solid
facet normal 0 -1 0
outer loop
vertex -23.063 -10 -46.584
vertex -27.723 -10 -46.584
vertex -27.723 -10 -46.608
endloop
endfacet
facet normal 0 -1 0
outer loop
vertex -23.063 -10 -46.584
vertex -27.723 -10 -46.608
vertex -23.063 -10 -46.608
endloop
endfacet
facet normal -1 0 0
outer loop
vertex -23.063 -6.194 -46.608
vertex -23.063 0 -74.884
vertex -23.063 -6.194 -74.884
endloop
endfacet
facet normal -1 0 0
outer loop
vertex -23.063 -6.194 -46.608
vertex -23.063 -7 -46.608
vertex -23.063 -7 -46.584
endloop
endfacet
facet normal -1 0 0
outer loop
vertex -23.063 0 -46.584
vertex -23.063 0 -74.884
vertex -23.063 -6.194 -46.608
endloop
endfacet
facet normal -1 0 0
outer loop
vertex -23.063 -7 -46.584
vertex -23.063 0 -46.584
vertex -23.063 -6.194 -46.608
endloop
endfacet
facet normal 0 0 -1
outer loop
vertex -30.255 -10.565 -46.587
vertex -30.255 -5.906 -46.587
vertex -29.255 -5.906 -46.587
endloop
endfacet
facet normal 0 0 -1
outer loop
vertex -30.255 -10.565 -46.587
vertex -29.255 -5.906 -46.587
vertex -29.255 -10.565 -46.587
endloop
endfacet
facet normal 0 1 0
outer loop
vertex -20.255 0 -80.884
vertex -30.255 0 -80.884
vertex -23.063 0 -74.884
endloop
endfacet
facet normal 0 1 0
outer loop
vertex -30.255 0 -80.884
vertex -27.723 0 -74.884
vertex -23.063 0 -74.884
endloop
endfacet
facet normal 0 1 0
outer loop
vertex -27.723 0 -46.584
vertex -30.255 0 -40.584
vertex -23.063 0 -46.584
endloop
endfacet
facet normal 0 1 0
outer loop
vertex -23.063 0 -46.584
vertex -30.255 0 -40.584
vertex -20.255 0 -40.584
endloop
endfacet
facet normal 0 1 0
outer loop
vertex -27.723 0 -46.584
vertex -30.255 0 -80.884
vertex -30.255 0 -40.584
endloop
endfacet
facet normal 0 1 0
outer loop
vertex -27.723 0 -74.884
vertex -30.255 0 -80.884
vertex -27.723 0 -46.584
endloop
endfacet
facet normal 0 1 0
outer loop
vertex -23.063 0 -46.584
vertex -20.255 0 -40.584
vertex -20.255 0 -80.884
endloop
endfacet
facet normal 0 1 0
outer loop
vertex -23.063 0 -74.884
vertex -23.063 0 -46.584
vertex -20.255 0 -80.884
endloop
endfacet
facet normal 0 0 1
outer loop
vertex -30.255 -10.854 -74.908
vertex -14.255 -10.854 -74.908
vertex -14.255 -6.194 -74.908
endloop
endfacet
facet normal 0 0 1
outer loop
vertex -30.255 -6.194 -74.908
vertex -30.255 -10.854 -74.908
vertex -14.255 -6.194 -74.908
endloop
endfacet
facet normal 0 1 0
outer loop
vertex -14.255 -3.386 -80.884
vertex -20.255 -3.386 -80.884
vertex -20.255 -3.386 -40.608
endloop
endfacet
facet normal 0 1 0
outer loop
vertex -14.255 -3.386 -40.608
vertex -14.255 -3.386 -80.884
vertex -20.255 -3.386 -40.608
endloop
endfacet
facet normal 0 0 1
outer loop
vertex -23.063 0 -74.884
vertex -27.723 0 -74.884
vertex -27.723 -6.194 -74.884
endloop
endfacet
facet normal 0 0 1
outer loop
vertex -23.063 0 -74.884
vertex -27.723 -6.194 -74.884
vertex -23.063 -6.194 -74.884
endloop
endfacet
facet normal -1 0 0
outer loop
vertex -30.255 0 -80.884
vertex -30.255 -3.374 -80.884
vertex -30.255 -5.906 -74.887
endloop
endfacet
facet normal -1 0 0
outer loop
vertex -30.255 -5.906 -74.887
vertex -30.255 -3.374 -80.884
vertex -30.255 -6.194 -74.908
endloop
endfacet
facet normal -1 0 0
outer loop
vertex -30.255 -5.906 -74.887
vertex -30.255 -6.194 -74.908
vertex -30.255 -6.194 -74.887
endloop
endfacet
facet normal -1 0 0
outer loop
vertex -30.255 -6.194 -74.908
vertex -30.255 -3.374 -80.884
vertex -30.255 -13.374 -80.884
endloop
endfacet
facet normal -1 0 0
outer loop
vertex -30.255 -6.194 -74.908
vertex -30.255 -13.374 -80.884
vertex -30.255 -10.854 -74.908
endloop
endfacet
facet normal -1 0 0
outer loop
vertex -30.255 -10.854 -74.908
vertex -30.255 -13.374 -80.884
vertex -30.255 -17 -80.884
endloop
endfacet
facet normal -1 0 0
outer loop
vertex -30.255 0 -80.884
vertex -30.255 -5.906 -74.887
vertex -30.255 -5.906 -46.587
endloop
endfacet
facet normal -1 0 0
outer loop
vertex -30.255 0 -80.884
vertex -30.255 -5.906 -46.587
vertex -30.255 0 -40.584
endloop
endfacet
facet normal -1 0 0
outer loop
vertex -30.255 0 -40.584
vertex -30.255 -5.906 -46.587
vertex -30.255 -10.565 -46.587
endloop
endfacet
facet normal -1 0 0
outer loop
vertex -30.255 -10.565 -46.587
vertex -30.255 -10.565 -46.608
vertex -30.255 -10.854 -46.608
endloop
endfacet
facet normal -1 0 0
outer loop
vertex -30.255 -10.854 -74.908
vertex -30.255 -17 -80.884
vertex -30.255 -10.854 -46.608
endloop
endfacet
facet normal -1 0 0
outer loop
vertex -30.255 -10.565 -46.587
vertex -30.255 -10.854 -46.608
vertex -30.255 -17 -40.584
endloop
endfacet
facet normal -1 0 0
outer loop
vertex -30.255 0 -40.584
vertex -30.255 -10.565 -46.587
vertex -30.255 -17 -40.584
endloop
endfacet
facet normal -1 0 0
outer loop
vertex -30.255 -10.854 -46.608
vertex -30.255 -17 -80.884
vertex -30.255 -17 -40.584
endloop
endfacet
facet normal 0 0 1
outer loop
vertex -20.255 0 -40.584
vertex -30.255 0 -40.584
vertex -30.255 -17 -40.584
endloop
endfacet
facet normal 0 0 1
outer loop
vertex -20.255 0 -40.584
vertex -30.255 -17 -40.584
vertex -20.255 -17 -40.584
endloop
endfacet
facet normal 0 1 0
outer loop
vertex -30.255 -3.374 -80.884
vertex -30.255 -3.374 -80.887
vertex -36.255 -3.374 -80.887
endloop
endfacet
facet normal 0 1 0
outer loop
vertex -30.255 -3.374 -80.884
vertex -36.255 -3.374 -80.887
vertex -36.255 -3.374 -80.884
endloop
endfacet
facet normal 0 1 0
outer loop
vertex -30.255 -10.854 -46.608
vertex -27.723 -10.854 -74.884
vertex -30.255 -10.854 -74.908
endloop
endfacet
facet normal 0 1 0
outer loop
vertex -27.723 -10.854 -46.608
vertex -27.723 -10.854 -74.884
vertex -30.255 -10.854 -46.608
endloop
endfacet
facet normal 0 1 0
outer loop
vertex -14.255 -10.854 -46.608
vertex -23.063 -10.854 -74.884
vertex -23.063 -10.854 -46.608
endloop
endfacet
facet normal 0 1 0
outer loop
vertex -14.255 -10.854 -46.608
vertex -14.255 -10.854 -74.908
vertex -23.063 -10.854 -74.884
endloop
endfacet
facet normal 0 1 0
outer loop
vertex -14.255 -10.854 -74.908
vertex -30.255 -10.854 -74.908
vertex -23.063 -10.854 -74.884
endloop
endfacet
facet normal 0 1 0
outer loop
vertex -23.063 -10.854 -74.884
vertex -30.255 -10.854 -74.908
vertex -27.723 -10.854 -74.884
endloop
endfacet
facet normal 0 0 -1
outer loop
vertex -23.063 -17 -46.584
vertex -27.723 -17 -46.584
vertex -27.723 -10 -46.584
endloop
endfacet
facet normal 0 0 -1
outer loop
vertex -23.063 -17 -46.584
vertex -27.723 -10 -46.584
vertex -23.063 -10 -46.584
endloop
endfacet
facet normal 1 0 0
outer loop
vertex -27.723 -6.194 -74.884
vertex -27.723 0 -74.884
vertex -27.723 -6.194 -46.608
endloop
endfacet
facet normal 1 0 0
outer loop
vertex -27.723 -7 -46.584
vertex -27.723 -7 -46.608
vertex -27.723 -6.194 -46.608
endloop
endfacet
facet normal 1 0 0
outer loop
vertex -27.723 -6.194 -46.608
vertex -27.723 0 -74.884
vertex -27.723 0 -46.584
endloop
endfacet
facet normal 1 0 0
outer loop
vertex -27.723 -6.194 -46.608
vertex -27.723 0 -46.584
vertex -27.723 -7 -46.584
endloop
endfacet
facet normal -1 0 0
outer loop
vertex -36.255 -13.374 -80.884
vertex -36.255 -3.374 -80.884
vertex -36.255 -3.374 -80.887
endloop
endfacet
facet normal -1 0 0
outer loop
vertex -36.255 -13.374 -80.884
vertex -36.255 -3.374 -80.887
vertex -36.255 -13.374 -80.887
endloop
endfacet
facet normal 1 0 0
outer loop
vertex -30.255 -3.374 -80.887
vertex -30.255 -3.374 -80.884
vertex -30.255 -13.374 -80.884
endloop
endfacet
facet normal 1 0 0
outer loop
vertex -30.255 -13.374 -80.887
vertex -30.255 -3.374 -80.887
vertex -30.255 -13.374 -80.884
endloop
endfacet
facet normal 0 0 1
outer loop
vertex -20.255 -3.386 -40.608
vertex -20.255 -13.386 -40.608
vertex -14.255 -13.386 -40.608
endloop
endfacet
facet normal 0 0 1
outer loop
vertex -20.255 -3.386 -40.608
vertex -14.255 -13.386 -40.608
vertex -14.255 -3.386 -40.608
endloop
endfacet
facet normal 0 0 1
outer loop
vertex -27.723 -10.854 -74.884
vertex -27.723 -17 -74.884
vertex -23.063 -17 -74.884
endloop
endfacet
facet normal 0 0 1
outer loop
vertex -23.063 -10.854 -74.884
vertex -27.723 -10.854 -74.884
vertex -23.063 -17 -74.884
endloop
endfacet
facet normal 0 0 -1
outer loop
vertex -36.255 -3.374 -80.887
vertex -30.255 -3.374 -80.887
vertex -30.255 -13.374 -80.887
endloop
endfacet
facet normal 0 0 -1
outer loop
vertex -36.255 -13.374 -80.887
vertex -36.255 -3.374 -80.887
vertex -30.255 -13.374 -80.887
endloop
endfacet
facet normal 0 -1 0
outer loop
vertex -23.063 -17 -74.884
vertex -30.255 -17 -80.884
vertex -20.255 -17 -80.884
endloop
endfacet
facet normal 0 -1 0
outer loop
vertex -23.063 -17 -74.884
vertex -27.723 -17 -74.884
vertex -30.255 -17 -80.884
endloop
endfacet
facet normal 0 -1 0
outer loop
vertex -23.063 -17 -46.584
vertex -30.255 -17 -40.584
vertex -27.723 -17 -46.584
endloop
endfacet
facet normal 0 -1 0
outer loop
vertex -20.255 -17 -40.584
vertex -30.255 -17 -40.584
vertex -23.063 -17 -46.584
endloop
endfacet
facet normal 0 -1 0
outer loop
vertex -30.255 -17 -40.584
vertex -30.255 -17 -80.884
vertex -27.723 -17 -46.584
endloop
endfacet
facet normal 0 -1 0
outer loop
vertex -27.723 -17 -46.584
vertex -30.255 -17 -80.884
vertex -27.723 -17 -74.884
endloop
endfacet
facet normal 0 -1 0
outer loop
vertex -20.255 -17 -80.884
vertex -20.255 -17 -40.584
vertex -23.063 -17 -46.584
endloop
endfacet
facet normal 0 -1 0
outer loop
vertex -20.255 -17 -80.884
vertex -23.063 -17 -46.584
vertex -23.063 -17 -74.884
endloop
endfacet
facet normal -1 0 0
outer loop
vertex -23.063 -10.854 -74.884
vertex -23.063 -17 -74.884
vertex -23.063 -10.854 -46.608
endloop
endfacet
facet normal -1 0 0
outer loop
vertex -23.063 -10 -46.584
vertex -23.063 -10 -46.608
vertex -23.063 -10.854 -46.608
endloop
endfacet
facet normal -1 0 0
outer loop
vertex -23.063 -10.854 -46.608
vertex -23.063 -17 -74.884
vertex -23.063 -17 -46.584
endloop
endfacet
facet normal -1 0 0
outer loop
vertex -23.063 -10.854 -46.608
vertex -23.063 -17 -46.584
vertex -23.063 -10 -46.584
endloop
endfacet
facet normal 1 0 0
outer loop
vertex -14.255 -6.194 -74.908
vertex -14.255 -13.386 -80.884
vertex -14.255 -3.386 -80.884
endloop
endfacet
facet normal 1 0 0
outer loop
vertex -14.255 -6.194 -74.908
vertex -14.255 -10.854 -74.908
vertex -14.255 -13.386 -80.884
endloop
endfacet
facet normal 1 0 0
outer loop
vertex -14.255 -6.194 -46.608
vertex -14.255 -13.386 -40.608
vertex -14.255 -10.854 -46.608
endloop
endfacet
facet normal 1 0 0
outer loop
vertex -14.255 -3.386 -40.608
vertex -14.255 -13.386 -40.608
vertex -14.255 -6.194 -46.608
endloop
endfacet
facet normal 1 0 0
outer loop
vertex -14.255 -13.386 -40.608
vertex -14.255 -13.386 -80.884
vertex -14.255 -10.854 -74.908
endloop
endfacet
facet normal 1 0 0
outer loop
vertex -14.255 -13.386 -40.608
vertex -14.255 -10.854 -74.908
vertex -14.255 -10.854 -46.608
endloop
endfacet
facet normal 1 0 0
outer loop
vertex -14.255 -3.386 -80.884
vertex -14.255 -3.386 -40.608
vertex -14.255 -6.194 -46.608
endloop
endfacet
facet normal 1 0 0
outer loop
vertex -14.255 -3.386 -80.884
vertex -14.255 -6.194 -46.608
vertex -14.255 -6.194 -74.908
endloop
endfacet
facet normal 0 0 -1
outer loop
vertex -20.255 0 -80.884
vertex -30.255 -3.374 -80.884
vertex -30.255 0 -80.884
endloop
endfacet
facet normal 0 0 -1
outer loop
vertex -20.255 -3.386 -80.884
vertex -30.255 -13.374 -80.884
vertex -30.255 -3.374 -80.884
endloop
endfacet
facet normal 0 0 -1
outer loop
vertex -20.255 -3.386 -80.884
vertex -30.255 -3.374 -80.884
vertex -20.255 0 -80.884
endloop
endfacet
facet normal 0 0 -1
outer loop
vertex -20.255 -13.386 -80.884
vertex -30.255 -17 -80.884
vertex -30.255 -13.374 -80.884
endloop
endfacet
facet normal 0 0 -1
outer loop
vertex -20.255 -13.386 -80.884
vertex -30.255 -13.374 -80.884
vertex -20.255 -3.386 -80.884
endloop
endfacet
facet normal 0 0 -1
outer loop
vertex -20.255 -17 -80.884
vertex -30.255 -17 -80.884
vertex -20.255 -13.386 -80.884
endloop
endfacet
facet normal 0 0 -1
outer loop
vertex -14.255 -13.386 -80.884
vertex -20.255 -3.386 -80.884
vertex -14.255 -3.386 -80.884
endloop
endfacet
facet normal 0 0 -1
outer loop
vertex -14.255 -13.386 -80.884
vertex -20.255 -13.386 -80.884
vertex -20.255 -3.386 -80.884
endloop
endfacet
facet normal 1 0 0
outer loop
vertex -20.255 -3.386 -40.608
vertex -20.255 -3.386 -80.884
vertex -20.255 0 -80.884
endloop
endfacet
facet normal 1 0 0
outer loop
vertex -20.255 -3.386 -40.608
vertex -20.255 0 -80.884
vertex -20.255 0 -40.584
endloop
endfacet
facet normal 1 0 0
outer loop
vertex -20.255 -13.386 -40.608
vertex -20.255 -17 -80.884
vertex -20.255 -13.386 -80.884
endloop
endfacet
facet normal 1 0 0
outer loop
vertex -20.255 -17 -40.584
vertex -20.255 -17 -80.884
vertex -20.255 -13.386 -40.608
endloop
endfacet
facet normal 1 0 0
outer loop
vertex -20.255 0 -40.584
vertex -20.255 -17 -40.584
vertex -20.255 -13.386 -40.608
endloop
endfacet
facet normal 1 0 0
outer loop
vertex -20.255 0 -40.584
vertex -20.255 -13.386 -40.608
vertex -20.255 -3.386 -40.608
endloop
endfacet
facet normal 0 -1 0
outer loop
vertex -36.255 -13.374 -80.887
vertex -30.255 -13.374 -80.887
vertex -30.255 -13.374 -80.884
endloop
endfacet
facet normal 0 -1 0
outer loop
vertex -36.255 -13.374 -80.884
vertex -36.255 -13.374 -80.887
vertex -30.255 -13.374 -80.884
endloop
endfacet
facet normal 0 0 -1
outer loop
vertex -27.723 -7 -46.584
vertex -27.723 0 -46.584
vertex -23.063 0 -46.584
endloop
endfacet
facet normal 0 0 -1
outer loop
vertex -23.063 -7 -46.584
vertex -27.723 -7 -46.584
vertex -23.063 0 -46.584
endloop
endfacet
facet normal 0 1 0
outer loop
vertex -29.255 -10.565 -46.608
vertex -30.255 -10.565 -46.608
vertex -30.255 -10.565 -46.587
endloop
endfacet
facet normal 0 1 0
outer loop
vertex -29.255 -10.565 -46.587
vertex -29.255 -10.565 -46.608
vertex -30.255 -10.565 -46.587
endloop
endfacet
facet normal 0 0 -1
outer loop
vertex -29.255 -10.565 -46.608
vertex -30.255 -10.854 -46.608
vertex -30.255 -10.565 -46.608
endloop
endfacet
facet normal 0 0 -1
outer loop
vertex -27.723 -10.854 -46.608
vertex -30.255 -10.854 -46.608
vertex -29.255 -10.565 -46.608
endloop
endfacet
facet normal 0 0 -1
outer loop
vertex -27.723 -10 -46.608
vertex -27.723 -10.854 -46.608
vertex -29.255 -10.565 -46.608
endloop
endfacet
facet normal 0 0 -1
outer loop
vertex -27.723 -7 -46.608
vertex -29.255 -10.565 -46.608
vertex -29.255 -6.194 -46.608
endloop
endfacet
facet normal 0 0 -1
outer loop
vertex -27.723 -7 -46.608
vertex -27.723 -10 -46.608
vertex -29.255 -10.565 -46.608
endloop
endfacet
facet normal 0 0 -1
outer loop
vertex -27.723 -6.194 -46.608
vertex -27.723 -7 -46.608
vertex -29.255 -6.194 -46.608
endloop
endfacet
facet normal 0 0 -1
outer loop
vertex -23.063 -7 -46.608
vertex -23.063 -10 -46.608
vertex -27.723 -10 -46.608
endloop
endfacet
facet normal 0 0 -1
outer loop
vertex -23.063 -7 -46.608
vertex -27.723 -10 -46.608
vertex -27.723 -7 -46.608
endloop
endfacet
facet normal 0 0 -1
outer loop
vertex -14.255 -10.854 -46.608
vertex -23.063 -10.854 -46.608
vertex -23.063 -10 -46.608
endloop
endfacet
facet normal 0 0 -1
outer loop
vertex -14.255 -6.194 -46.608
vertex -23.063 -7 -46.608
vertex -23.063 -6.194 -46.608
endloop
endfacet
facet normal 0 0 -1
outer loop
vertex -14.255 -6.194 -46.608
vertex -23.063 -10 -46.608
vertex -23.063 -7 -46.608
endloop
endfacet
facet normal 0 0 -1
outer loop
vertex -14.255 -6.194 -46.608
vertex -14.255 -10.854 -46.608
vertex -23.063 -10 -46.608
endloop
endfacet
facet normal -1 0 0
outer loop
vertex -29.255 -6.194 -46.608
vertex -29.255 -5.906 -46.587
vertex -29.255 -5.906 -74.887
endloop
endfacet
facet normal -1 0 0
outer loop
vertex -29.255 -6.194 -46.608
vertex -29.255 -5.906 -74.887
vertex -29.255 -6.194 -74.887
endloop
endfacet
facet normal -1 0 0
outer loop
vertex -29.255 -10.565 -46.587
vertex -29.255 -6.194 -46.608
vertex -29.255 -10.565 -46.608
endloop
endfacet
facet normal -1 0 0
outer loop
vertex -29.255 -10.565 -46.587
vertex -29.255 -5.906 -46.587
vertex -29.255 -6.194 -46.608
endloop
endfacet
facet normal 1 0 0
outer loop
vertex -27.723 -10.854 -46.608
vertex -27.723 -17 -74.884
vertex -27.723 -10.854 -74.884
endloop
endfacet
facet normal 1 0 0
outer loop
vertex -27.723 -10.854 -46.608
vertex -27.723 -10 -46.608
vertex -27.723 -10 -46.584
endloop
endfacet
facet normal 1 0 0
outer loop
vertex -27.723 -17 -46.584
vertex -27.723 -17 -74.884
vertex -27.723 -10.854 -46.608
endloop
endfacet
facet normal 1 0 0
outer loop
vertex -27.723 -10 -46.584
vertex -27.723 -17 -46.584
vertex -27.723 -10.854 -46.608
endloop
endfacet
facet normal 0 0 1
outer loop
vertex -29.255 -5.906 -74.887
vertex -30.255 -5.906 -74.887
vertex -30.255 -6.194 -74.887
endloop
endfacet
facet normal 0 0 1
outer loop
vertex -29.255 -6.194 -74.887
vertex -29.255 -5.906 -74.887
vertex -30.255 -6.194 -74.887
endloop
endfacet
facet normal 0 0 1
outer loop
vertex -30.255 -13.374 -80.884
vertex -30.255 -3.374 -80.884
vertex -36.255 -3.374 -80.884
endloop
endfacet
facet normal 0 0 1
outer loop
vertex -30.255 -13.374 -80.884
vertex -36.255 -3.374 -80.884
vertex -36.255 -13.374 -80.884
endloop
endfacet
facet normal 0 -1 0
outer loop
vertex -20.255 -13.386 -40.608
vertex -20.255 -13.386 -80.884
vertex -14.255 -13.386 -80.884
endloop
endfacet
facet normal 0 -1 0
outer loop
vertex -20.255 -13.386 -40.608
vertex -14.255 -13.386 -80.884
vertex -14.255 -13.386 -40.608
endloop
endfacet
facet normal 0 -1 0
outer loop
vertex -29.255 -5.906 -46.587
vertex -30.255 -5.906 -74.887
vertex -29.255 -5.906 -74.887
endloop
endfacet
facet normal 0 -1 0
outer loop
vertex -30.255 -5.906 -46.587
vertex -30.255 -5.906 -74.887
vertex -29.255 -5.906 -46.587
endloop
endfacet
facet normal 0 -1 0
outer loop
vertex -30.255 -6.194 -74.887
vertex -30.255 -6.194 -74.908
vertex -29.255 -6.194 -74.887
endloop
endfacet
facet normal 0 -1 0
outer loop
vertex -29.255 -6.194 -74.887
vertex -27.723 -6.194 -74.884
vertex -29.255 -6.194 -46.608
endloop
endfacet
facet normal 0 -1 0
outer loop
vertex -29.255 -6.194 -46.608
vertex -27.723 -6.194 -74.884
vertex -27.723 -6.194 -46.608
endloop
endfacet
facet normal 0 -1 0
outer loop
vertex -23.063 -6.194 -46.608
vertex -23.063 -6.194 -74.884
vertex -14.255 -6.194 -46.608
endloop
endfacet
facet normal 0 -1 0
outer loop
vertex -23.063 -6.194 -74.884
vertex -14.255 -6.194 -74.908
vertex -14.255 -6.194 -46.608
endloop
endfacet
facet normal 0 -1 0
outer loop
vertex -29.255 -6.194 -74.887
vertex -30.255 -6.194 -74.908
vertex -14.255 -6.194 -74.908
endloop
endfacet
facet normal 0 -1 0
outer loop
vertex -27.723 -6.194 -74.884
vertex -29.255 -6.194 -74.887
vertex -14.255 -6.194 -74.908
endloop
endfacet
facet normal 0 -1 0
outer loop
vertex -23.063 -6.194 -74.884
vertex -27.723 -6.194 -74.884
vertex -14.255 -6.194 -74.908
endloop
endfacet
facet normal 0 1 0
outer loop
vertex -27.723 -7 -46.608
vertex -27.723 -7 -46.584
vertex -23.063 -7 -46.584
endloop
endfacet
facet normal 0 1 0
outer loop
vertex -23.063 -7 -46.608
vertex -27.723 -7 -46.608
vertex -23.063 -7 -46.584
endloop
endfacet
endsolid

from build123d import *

# Parameters (mm, degrees)
F0_W     = 10
F0_H     = 40.3
F0_W_2   = 4.6593984449
F0_H_2   = 28.3
F1_DEPTH = 8.5
F2_DEPTH = 7
F4_W     = 10
F4_H     = 0.0023088843
F5_DEPTH = 6
F4_W_2   = 4.6593984449
F4_H_2   = 28.3
F6_DEPTH = 1
F7_W     = 10
F7_H     = 40.2760509044
F7_W_2   = 4.6593984449
F7_H_2   = 28.3
F8_DEPTH = 6
F9_DEPTH = 25.4


# Not quite as in the source:
# - a feature names something its author has since deleted; it is built from what else it names


with BuildPart() as f1:
    # F0 (on Front) → F1 (new body)
    with BuildSketch(Plane.XZ):
        with Locations((-25.2545091997, -60.7344553381)):
            Rectangle(F0_W, F0_H)
        with Locations((-25.3930282849, -60.7344553381)):
            Rectangle(F0_W_2, F0_H_2, mode=Mode.SUBTRACT)
        with Locations((-25.3930282849, -60.7344553381)):
            Rectangle(F0_W_2, F0_H_2)
    extrude(amount=F1_DEPTH)

    # F0 (on Front) → F2 (cut)
    with BuildSketch(Plane.XZ):
        with Locations((-25.3930282849, -60.7344553381)):
            Rectangle(F0_W_2, F0_H_2)
    extrude(amount=F2_DEPTH, mode=Mode.SUBTRACT)

    # F3: F1 across face


with BuildPart() as f1_1:
    add(f1.part)
    add(f1.part.mirror(Plane(origin=(-25.2545091997, -8.5, -60.7344553381), x_dir=(1, 0, 0), z_dir=(0, -1, 0))))

    # F4 (on face) → F5 (join)
    with BuildSketch(Plane(origin=(-30.2545091997, 0, 0), x_dir=(0, -1, 0), z_dir=(-1, 0, 0))):
        with Locations((8.3737515296, -80.8856097803)):
            Rectangle(F4_W, F4_H)
    extrude(amount=F5_DEPTH)

    # F4 (on face) → F6 (cut)
    with BuildSketch(Plane(origin=(-30.2545091997, 0, 0), x_dir=(0, -1, 0), z_dir=(-1, 0, 0))):
        with Locations((8.2352324444, -60.7367642224)):
            Rectangle(F4_W_2, F4_H_2)
    extrude(amount=-F6_DEPTH, mode=Mode.SUBTRACT)

    # F7 (on face) → F8 (join)
    with BuildSketch(Plane.YZ.offset(-20.2545091997)):
        with Locations((-8.3855800414, -60.7464298859)):
            Rectangle(F7_W, F7_H)
        with Locations((-8.5240991265, -60.7584044337)):
            Rectangle(F7_W_2, F7_H_2, mode=Mode.SUBTRACT)
    extrude(amount=F8_DEPTH)

    # F9 (cut): a face of the model
    f9_faces = [f1_1.faces().sort_by_distance(p)[0] for p in [
        (-20.2545091997, -8.5240991265, -60.7584044337),
    ]]
    extrude(f9_faces, amount=-F9_DEPTH, mode=Mode.SUBTRACT)


solid = f1_1.part
